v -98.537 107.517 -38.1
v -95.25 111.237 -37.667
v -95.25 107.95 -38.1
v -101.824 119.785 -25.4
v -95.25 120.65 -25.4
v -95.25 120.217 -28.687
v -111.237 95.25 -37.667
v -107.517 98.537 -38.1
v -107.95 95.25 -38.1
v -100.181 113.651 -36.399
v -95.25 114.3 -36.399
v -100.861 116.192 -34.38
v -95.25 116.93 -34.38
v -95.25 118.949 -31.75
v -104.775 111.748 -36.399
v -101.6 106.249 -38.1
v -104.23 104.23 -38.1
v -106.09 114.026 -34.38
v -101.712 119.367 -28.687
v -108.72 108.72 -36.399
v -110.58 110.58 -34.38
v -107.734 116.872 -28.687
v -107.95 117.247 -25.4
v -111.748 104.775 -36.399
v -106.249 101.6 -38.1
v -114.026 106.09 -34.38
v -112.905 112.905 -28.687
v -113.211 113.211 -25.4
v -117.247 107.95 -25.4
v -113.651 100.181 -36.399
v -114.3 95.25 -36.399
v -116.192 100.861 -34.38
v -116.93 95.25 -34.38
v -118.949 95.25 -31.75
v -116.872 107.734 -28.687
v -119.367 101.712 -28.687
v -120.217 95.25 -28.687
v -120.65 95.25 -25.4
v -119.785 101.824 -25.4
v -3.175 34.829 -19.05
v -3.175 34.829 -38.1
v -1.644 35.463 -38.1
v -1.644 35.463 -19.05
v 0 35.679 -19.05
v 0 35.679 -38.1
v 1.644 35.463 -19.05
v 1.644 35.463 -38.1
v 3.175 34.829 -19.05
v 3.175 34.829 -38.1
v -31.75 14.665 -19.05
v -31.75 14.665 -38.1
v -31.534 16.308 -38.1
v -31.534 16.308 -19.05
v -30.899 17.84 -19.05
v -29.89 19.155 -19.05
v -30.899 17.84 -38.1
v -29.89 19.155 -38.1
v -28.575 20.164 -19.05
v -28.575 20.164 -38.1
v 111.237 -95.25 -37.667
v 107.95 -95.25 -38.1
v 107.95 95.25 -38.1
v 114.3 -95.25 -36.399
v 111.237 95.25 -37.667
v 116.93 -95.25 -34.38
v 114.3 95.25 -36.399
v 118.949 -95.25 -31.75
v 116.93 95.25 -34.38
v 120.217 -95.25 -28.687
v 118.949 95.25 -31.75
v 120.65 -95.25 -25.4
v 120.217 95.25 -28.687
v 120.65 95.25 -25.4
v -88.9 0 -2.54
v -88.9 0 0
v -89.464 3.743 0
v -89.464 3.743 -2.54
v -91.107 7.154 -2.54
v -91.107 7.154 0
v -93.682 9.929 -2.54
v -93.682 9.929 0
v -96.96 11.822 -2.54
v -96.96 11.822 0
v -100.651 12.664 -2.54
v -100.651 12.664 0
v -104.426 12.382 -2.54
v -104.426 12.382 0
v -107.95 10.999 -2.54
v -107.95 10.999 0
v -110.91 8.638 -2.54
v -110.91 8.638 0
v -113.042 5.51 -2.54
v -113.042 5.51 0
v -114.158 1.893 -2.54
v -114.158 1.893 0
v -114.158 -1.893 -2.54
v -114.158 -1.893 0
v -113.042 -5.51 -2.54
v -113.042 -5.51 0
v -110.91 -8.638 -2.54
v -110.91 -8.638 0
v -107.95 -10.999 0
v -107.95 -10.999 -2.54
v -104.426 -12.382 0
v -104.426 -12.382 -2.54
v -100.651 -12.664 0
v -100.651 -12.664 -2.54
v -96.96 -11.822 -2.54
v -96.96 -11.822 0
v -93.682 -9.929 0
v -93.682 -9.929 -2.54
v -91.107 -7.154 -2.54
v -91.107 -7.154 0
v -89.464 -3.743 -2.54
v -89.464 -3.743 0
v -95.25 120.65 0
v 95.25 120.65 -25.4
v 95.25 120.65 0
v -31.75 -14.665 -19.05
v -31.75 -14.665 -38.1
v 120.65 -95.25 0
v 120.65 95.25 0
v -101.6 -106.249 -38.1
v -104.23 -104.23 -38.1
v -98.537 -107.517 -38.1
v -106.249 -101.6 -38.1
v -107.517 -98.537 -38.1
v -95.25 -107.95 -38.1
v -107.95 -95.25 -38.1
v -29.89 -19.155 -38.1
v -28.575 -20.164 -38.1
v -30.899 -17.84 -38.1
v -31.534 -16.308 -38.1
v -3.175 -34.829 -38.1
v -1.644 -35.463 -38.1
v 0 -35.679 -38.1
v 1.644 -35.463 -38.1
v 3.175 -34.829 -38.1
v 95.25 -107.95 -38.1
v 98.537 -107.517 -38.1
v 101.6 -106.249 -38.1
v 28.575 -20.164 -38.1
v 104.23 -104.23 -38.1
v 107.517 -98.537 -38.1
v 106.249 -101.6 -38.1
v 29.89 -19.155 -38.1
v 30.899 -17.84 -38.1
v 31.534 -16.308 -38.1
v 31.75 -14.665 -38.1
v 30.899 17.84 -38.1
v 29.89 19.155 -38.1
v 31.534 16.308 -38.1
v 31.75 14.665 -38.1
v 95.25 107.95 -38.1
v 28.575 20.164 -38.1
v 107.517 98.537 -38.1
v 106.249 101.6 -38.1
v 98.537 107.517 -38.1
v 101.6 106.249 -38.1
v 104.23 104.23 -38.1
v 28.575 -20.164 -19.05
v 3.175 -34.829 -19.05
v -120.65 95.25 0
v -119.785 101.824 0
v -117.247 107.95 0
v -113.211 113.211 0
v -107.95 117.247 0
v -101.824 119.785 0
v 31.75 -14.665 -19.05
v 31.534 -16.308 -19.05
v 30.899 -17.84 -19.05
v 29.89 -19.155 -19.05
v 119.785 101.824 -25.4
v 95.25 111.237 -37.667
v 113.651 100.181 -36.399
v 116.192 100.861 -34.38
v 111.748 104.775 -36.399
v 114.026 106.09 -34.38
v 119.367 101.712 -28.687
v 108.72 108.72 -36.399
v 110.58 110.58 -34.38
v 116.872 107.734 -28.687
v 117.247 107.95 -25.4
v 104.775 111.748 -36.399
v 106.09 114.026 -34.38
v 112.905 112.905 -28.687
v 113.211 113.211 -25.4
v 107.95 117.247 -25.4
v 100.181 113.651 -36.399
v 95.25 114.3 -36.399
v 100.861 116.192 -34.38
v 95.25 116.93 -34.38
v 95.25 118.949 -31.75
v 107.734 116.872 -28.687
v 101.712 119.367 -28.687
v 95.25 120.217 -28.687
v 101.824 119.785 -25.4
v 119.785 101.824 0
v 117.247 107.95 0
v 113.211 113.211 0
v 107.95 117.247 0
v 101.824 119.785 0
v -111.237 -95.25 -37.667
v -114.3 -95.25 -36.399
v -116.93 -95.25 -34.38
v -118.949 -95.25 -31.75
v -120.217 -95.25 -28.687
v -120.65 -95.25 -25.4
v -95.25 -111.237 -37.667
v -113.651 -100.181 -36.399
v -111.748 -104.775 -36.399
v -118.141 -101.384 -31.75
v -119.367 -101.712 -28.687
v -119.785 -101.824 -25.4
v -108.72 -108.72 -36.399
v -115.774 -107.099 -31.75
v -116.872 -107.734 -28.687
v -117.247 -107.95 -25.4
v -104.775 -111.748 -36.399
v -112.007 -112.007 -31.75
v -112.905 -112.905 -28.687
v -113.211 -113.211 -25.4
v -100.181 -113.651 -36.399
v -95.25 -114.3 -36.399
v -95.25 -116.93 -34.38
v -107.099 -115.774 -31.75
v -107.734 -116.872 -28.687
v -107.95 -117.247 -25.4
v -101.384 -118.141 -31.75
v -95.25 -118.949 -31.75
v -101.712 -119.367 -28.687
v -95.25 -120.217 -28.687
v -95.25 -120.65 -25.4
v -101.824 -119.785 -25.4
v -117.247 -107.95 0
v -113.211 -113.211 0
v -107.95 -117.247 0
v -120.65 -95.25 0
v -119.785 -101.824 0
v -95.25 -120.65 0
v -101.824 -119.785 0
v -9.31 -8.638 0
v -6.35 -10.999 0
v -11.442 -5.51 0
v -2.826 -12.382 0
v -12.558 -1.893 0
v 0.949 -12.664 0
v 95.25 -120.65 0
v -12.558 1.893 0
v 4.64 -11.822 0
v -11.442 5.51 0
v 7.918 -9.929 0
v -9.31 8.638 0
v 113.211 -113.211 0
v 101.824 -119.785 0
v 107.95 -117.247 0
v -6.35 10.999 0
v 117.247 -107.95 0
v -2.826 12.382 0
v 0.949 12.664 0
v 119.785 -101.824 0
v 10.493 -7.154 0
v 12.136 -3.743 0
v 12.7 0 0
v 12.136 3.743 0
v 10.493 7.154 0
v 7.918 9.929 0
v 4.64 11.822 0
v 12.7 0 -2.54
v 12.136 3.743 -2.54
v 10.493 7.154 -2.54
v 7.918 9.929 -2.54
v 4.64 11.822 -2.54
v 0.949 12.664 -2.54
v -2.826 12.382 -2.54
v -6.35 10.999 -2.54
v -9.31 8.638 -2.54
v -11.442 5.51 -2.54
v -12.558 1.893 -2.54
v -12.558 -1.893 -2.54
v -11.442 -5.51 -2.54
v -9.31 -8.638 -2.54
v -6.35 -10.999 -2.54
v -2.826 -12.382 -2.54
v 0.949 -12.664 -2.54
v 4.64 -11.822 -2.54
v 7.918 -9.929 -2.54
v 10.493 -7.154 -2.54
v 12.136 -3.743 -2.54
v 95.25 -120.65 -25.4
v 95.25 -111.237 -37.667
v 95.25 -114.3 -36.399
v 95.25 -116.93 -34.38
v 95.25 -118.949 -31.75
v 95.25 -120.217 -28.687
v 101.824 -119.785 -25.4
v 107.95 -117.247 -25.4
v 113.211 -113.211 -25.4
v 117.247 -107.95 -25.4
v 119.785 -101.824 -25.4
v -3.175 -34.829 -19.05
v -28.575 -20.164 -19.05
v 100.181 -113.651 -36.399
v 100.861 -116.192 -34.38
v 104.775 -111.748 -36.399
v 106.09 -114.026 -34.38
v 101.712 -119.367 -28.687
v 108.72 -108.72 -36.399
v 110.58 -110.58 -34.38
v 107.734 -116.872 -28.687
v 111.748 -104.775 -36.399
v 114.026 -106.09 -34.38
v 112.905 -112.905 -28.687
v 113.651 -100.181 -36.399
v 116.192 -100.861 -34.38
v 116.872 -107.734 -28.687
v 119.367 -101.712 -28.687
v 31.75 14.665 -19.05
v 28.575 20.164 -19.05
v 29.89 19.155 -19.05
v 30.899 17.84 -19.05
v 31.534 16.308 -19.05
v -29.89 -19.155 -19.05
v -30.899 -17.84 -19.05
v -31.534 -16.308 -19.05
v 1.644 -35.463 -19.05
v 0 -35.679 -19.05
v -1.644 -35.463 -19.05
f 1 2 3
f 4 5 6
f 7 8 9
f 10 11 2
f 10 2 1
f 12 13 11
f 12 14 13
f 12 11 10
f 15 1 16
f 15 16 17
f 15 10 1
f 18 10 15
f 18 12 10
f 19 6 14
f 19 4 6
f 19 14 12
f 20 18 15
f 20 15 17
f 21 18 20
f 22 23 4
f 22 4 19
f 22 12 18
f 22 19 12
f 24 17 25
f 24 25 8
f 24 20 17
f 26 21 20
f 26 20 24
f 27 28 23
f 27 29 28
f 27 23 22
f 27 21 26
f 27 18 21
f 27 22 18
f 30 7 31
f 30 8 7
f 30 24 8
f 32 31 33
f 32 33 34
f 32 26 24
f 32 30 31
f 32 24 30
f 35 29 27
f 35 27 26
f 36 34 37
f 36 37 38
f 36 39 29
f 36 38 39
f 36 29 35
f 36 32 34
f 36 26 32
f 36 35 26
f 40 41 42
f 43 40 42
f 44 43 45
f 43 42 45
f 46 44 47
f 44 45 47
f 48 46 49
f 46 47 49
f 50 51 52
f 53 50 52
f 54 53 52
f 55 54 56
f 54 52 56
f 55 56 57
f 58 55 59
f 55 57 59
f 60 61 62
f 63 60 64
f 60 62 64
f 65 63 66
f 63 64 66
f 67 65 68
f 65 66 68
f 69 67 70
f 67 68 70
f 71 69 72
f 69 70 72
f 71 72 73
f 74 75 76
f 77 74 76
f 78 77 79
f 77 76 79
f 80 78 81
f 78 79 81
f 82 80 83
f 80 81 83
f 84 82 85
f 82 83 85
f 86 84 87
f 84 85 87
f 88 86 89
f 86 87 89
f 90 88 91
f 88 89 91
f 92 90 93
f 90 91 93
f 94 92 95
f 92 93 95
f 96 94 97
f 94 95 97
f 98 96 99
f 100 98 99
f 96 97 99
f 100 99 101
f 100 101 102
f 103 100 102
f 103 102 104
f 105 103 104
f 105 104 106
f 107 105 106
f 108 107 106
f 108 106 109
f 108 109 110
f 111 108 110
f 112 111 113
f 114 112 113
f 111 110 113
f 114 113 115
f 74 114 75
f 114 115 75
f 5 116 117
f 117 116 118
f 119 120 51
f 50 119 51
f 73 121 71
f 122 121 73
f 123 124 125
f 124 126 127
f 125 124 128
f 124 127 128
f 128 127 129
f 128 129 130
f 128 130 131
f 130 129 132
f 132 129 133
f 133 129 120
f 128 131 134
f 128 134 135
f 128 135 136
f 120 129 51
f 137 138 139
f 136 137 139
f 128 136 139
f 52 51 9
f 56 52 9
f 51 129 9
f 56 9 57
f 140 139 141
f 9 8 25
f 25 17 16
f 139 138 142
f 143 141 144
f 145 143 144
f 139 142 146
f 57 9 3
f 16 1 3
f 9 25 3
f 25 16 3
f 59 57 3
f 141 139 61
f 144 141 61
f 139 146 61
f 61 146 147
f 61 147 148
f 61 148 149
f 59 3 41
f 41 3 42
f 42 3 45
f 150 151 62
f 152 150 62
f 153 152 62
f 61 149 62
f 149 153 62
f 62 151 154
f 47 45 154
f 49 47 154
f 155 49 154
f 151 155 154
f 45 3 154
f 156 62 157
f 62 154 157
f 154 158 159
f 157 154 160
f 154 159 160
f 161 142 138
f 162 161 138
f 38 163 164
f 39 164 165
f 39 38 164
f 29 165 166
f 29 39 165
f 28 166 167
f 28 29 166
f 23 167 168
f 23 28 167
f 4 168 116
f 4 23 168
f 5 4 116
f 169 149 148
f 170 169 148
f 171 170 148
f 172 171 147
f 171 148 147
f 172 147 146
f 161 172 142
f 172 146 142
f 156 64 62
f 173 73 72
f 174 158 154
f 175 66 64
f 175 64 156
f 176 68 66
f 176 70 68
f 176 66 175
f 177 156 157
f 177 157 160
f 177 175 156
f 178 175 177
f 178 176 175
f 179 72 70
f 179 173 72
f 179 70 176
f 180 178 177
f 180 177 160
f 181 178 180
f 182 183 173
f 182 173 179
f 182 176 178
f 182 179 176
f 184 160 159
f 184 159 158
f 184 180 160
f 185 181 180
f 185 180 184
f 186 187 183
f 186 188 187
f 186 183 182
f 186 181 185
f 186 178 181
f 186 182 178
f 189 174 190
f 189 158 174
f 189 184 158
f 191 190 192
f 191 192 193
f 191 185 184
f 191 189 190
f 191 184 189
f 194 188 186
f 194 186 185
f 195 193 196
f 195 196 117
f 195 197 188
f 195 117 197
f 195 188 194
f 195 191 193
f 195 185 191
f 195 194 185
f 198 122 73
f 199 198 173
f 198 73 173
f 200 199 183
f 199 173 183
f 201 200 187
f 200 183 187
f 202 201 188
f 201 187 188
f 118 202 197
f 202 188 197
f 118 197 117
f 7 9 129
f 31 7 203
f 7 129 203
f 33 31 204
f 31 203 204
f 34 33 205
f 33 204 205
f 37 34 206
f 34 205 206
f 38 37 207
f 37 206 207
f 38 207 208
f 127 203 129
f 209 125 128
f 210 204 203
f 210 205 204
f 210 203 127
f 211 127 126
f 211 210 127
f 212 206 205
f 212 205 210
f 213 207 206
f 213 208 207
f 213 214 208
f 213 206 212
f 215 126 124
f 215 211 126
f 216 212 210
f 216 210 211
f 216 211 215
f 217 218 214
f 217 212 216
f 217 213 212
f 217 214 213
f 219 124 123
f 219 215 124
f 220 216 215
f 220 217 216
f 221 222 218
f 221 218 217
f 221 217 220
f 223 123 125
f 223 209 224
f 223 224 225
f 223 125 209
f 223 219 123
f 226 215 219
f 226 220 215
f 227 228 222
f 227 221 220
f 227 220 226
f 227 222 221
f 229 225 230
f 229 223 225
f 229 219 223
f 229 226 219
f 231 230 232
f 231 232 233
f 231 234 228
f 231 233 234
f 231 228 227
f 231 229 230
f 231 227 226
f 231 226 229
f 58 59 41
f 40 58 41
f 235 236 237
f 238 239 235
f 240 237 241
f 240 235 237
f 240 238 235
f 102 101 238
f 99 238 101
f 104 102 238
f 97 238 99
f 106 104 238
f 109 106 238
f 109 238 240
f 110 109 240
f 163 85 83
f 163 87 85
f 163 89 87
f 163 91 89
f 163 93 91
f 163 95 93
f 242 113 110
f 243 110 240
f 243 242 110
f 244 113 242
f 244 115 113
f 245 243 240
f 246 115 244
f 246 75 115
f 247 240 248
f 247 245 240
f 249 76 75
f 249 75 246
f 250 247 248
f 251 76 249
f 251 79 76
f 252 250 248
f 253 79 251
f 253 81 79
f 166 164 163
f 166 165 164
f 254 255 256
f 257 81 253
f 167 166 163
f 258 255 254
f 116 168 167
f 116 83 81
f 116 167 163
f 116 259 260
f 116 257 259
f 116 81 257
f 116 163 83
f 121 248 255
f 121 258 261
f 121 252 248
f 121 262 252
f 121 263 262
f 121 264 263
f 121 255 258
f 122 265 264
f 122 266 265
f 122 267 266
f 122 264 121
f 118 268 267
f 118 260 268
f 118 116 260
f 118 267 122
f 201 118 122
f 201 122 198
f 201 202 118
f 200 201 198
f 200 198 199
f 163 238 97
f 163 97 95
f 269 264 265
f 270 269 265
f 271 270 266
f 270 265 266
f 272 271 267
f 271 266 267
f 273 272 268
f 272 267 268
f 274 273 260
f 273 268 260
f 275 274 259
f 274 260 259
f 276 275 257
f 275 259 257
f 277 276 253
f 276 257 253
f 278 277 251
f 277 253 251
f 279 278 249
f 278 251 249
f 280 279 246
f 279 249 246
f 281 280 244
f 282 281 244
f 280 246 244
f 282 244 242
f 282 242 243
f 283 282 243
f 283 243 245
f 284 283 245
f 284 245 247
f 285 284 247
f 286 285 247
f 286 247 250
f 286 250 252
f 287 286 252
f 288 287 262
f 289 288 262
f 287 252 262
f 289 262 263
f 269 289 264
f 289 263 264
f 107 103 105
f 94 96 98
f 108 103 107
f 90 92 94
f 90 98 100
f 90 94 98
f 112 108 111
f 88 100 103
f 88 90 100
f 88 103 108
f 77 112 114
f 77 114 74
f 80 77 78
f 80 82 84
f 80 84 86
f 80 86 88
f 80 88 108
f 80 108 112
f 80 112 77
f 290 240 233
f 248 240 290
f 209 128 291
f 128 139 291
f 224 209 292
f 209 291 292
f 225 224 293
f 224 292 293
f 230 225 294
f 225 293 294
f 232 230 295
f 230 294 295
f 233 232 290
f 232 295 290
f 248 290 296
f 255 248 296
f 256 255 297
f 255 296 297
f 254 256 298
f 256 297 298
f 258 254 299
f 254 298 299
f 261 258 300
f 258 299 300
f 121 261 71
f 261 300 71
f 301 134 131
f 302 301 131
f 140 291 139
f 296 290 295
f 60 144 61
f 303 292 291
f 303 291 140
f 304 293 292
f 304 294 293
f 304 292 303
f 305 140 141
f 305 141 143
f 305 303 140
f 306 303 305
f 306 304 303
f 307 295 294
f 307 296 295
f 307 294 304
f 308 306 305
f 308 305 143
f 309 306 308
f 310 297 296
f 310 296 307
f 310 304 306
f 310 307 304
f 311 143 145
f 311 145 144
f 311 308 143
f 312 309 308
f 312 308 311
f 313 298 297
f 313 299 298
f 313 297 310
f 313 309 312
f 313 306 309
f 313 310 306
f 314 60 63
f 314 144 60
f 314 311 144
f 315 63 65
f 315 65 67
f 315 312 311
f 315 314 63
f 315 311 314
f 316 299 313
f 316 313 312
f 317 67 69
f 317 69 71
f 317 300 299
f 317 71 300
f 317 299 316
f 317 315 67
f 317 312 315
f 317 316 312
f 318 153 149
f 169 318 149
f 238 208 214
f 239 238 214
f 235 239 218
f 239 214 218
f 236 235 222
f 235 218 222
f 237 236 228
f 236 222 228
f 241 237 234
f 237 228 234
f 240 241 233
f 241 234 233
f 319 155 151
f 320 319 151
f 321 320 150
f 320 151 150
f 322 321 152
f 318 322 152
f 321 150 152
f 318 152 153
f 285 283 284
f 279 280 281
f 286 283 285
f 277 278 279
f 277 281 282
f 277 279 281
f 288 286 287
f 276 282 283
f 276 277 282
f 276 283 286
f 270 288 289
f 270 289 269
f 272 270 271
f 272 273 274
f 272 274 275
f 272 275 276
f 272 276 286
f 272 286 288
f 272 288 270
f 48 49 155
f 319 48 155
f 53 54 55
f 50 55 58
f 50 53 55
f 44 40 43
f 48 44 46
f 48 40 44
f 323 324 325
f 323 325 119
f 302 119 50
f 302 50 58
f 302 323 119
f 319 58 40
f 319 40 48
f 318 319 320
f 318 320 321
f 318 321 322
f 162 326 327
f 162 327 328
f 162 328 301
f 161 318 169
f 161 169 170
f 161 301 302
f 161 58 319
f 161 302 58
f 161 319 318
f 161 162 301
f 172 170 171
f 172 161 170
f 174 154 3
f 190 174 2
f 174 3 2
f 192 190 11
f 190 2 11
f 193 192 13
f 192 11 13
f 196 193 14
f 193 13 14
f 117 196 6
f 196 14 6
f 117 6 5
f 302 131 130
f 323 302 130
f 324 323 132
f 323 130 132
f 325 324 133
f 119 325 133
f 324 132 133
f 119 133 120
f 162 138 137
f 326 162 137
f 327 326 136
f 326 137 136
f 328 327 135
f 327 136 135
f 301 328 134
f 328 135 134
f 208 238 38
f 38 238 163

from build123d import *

# Parameters (mm, degrees)
F0_W     = 241.3
F0_H     = 241.3
F1_DEPTH = 38.1
F2_R     = 25.4
F3_R     = 12.7
F5_DEPTH = 19.05
F6_R     = 12.7
F7_DEPTH = 2.54
F8_R     = 12.7
F9_DEPTH = 2.54


with BuildPart() as f1:
    # F0 (on Top) → F1 (new body)
    with BuildSketch(Plane.XY):
        Rectangle(F0_W, F0_H)
    extrude(amount=-F1_DEPTH)

    # F2
    f2_edges = [f1.edges().sort_by_distance(p)[0] for p in [
        (-120.65, -120.65, -19.05),
        (-120.65, 120.65, -19.05),
        (120.65, 120.65, -19.05),
        (120.65, -120.65, -19.05),
    ]]
    fillet(f2_edges, radius=F2_R)

    # F3
    f3_edges = [f1.edges().sort_by_distance(p)[0] for p in [
        (0, -120.65, -38.1),
    ]]
    fillet(f3_edges, radius=F3_R)

    # F4 (on face) → F5 (cut)
    with BuildSketch(Plane(origin=(0, 0, -38.1), x_dir=(1, 0, 0), z_dir=(0, 0, -1))):
        with BuildLine():
            Line((-28.575, -20.163958), (-3.175, -34.828655))
            ThreePointArc((-3.175, -34.828655), (0, -35.679394), (3.175, -34.828655))
            Line((3.175, -34.828655), (28.575, -20.163958))
            ThreePointArc((28.575, -20.163958), (30.899261, -17.839697), (31.75, -14.664697))
            Line((31.75, -14.664697), (31.75, 14.664697))
            ThreePointArc((31.75, 14.664697), (30.899261, 17.839697), (28.575, 20.163958))
            Line((28.575, 20.163958), (3.175, 34.828655))
            ThreePointArc((3.175, 34.828655), (0, 35.679394), (-3.175, 34.828655))
            Line((-3.175, 34.828655), (-28.575, 20.163958))
            ThreePointArc((-28.575, 20.163958), (-30.899261, 17.839697), (-31.75, 14.664697))
            Line((-31.75, 14.664697), (-31.75, -14.664697))
            ThreePointArc((-31.75, -14.664697), (-30.899261, -17.839697), (-28.575, -20.163958))
        make_face()
    extrude(amount=-F5_DEPTH, mode=Mode.SUBTRACT)

    # F6 (on face) → F7 (cut)
    with BuildSketch(Plane.XY):
        with Locations((-101.6, 0)):
            Circle(F6_R)
    extrude(amount=-F7_DEPTH, mode=Mode.SUBTRACT)

    # F8 (on face) → F9 (cut)
    with BuildSketch(Plane.XY):
        Circle(F8_R)
    extrude(amount=-F9_DEPTH, mode=Mode.SUBTRACT)


solid = f1.part
